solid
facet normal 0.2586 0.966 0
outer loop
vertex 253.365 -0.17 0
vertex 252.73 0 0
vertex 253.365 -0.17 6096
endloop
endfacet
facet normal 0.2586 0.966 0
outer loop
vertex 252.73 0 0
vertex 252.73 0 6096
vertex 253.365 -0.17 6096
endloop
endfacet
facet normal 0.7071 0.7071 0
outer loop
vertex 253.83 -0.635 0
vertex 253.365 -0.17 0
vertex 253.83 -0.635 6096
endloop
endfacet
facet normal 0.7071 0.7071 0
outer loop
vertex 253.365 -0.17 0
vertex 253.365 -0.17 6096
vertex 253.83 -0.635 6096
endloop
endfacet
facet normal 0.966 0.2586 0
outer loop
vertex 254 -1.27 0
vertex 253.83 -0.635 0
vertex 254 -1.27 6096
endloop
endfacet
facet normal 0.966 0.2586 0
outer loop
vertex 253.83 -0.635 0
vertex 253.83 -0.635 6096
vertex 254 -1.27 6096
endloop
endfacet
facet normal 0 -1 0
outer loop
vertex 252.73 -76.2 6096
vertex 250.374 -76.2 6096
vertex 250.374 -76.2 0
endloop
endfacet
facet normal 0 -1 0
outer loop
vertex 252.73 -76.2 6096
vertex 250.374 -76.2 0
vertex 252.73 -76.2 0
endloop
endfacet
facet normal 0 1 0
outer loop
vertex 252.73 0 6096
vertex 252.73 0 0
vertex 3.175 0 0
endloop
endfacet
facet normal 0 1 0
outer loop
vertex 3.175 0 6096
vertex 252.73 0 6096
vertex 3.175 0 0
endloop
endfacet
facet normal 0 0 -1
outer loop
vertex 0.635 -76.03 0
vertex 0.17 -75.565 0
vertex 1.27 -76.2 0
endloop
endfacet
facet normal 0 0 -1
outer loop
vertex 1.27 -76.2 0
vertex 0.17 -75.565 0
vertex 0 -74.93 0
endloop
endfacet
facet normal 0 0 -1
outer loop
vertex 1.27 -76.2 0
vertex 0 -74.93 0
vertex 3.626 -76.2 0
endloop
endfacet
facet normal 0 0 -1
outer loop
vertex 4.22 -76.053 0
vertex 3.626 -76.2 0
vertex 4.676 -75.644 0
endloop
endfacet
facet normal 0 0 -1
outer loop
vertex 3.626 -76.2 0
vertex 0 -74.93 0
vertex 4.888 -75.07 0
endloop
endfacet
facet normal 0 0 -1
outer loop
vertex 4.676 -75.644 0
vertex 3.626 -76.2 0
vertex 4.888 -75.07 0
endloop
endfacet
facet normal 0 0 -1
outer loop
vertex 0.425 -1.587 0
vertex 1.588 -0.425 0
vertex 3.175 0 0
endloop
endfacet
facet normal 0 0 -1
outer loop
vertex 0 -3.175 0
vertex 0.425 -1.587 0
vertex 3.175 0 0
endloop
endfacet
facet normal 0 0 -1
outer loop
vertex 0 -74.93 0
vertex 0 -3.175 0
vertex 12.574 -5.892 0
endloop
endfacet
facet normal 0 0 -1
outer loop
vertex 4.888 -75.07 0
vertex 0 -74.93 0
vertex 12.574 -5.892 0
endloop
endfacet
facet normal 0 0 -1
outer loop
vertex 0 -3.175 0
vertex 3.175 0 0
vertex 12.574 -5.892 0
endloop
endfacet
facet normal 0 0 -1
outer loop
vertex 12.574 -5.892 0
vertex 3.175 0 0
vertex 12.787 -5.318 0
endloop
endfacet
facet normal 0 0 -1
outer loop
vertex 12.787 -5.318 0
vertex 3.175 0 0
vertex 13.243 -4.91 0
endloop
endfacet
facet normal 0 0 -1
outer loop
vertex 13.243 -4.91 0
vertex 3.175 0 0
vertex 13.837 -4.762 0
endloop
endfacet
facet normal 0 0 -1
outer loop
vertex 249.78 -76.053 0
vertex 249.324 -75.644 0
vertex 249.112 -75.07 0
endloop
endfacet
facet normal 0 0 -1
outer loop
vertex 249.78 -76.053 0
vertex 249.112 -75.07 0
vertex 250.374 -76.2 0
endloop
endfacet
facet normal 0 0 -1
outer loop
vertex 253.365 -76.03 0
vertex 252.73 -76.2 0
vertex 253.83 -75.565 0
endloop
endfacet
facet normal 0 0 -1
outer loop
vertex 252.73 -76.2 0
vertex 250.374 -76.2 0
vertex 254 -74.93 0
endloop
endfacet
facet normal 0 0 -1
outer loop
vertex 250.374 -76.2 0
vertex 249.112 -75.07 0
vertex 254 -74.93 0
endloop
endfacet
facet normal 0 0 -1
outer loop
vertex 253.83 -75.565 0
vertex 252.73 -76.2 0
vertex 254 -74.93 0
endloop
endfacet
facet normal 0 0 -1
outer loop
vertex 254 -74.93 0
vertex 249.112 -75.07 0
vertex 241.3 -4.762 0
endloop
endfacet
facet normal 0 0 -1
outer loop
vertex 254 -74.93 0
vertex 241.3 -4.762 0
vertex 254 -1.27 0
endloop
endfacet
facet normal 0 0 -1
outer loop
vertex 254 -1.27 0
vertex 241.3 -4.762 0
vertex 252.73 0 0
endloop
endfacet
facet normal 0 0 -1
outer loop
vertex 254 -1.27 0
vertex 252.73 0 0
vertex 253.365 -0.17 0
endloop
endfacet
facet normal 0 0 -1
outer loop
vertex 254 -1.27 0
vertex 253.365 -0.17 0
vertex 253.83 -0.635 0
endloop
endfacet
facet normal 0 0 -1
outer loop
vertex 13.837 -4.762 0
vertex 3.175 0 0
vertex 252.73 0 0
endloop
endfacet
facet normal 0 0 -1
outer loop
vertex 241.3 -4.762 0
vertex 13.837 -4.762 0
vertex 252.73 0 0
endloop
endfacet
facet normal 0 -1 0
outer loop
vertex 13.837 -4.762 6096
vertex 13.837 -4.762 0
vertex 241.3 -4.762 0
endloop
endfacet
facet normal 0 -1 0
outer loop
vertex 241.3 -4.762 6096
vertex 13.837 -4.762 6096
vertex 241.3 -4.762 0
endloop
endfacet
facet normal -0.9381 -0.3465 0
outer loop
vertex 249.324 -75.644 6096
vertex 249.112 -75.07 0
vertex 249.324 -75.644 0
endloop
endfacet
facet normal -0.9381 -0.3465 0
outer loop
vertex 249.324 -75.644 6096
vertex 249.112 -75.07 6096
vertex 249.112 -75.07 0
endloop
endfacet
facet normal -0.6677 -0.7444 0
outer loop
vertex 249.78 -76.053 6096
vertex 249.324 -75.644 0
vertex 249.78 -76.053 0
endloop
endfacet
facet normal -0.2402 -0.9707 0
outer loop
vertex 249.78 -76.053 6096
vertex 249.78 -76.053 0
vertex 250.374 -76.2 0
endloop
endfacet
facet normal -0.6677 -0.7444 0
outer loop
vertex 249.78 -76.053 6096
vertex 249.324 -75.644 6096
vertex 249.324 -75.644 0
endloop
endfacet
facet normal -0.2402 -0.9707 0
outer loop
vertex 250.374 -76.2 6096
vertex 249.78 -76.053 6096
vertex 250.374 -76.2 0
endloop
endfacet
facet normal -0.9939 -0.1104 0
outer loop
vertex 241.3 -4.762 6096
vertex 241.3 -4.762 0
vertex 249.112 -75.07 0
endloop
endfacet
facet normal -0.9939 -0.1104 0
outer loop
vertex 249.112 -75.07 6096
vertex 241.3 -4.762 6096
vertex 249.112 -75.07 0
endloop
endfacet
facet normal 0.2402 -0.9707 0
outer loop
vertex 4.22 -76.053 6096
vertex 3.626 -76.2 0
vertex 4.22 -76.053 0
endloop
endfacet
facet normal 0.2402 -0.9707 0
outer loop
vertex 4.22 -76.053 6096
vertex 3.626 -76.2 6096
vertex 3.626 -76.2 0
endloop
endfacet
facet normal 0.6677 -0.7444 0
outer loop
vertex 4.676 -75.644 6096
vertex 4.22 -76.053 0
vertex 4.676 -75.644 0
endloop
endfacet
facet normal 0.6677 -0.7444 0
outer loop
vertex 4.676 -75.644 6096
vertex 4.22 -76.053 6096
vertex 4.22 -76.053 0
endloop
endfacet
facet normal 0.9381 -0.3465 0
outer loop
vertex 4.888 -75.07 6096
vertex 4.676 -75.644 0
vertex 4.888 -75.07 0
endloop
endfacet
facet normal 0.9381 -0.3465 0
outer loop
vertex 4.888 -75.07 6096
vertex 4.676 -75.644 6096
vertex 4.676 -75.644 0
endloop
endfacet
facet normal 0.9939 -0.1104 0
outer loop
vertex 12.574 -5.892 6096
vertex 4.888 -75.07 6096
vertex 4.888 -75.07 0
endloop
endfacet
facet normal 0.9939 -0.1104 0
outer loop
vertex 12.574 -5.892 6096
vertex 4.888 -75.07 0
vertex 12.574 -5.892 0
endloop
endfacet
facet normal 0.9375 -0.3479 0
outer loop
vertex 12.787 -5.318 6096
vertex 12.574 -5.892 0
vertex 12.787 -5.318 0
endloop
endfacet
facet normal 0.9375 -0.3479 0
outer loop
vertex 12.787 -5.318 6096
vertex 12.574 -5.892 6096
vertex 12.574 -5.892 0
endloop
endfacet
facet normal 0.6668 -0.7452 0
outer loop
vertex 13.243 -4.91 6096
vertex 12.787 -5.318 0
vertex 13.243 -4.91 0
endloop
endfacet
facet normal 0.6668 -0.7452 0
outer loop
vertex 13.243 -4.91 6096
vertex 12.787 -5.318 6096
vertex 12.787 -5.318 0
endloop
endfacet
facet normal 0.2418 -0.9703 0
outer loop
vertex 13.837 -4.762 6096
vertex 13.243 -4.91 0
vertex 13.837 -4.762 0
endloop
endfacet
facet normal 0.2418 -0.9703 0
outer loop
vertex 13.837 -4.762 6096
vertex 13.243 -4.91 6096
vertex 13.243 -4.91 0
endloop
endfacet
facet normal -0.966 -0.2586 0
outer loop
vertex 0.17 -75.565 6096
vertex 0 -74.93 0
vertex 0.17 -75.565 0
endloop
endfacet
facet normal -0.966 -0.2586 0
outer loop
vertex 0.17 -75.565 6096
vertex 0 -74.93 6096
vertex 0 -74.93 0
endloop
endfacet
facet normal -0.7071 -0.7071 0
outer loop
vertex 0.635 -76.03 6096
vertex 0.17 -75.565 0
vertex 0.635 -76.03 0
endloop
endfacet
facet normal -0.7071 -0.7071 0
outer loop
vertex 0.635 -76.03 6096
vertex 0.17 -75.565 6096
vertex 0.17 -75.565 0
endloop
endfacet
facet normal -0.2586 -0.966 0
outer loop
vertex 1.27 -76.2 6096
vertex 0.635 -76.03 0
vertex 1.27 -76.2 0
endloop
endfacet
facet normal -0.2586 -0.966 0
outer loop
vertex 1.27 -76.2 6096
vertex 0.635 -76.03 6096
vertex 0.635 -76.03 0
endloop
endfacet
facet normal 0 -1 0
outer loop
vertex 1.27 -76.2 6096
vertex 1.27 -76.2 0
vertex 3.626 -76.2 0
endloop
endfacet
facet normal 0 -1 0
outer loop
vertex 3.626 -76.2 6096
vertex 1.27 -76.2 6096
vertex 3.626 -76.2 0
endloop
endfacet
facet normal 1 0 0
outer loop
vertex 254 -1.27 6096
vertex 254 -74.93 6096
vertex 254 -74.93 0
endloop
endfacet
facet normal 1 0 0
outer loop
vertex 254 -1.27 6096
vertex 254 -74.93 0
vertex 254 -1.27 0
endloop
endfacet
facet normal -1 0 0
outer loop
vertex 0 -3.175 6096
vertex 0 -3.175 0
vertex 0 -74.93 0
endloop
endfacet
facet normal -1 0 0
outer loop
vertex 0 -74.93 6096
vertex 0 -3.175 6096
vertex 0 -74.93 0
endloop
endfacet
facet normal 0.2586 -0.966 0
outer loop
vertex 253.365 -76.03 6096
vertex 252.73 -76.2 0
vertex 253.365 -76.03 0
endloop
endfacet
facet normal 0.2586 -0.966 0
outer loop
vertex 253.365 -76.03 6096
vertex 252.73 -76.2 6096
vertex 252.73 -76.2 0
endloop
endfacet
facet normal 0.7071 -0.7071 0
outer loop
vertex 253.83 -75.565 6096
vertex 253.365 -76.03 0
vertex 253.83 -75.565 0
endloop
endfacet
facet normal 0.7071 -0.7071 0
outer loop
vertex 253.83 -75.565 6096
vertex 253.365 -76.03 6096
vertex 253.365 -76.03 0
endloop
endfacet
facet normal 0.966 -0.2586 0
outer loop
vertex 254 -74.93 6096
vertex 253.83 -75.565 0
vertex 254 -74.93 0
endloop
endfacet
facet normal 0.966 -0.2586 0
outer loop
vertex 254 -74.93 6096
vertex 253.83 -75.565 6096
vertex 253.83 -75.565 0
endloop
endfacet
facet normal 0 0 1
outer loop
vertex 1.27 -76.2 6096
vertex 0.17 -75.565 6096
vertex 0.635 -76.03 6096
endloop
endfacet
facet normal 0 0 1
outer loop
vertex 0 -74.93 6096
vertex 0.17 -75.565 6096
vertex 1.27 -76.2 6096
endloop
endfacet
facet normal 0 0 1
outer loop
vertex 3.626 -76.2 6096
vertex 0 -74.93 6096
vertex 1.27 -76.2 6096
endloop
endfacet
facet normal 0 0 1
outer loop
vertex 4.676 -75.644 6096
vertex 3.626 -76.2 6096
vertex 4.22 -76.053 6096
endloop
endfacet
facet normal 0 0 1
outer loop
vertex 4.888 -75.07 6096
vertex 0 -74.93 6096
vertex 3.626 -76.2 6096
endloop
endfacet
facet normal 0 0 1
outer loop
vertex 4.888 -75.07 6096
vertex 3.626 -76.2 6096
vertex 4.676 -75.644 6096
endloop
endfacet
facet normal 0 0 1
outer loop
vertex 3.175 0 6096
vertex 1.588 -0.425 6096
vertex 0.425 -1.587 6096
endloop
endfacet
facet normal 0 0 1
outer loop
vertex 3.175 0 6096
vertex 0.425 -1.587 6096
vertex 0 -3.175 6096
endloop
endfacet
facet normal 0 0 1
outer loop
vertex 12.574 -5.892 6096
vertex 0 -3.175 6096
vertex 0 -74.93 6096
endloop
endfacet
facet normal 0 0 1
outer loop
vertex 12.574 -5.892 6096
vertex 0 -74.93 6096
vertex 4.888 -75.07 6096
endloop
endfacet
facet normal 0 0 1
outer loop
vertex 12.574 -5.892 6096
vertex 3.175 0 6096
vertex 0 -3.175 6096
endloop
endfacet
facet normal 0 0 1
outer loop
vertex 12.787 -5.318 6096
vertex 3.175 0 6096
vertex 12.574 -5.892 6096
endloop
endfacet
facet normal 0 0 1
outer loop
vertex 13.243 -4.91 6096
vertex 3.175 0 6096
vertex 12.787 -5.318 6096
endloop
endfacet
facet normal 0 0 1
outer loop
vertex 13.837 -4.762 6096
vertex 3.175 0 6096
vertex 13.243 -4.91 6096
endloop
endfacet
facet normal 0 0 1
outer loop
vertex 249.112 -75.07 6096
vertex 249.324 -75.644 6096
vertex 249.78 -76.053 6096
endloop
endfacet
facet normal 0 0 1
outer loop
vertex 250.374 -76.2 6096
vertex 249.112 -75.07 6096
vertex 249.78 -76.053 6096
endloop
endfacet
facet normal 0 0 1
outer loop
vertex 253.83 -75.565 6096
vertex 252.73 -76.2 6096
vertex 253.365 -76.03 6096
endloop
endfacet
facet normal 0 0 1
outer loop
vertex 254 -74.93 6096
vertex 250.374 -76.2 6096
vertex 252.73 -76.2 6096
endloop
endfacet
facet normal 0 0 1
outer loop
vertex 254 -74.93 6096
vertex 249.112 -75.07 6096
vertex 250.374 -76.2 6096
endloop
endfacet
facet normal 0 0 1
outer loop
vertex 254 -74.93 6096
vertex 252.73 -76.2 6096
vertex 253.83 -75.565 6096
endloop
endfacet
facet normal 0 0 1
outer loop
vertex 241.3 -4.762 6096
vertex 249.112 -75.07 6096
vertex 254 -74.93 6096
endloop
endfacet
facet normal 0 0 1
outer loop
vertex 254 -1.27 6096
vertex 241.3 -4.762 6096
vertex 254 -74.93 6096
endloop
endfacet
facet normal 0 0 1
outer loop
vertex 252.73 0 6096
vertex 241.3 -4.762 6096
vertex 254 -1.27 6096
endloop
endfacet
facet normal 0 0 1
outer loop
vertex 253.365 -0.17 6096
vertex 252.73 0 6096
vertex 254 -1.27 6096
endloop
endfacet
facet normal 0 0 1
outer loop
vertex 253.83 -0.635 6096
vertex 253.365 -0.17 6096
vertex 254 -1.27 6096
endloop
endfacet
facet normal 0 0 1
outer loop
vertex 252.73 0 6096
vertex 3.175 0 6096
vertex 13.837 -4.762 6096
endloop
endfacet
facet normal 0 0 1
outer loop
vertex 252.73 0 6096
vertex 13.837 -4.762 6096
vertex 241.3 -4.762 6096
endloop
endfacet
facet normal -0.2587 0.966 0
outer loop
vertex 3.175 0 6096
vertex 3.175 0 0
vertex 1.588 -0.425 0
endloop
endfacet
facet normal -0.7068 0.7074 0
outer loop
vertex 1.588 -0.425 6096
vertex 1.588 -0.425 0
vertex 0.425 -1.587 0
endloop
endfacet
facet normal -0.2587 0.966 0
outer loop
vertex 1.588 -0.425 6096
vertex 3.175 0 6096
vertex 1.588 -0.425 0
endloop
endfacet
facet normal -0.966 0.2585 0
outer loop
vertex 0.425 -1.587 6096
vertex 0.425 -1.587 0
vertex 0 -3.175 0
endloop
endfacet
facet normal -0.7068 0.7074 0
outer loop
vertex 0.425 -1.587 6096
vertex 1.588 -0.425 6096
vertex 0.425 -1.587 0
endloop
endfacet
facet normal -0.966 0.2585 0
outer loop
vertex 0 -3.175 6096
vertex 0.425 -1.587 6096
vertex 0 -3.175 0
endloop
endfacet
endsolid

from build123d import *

# Parameters (mm, degrees)
F1_DEPTH = 6096
F2_R     = 1.27
F3_R     = 3.175


with BuildPart() as f1:
    # F0 (on Top) → F1 (new body)
    with BuildSketch(Plane.XY):
        Polygon((254, 0), (0, 0), (0, -76.2), (4.7625, -76.2), (12.7, -4.7625), (241.3, -4.7625), (249.2375, -76.2), (254, -76.2), align=None)
    extrude(amount=F1_DEPTH)

    # F2
    f2_edges = [f1.edges().sort_by_distance(p)[0] for p in [
        (0, -76.2, 3048),
        (4.7625, -76.2, 3048),
        (12.7, -4.7625, 3048),
        (249.2375, -76.2, 3048),
        (254, -76.2, 3048),
        (254, 0, 3048),
    ]]
    fillet(f2_edges, radius=F2_R)

    # F3
    f3_edges = [f1.edges().sort_by_distance(p)[0] for p in [
        (0, 0, 3048),
    ]]
    fillet(f3_edges, radius=F3_R)


solid = f1.part
